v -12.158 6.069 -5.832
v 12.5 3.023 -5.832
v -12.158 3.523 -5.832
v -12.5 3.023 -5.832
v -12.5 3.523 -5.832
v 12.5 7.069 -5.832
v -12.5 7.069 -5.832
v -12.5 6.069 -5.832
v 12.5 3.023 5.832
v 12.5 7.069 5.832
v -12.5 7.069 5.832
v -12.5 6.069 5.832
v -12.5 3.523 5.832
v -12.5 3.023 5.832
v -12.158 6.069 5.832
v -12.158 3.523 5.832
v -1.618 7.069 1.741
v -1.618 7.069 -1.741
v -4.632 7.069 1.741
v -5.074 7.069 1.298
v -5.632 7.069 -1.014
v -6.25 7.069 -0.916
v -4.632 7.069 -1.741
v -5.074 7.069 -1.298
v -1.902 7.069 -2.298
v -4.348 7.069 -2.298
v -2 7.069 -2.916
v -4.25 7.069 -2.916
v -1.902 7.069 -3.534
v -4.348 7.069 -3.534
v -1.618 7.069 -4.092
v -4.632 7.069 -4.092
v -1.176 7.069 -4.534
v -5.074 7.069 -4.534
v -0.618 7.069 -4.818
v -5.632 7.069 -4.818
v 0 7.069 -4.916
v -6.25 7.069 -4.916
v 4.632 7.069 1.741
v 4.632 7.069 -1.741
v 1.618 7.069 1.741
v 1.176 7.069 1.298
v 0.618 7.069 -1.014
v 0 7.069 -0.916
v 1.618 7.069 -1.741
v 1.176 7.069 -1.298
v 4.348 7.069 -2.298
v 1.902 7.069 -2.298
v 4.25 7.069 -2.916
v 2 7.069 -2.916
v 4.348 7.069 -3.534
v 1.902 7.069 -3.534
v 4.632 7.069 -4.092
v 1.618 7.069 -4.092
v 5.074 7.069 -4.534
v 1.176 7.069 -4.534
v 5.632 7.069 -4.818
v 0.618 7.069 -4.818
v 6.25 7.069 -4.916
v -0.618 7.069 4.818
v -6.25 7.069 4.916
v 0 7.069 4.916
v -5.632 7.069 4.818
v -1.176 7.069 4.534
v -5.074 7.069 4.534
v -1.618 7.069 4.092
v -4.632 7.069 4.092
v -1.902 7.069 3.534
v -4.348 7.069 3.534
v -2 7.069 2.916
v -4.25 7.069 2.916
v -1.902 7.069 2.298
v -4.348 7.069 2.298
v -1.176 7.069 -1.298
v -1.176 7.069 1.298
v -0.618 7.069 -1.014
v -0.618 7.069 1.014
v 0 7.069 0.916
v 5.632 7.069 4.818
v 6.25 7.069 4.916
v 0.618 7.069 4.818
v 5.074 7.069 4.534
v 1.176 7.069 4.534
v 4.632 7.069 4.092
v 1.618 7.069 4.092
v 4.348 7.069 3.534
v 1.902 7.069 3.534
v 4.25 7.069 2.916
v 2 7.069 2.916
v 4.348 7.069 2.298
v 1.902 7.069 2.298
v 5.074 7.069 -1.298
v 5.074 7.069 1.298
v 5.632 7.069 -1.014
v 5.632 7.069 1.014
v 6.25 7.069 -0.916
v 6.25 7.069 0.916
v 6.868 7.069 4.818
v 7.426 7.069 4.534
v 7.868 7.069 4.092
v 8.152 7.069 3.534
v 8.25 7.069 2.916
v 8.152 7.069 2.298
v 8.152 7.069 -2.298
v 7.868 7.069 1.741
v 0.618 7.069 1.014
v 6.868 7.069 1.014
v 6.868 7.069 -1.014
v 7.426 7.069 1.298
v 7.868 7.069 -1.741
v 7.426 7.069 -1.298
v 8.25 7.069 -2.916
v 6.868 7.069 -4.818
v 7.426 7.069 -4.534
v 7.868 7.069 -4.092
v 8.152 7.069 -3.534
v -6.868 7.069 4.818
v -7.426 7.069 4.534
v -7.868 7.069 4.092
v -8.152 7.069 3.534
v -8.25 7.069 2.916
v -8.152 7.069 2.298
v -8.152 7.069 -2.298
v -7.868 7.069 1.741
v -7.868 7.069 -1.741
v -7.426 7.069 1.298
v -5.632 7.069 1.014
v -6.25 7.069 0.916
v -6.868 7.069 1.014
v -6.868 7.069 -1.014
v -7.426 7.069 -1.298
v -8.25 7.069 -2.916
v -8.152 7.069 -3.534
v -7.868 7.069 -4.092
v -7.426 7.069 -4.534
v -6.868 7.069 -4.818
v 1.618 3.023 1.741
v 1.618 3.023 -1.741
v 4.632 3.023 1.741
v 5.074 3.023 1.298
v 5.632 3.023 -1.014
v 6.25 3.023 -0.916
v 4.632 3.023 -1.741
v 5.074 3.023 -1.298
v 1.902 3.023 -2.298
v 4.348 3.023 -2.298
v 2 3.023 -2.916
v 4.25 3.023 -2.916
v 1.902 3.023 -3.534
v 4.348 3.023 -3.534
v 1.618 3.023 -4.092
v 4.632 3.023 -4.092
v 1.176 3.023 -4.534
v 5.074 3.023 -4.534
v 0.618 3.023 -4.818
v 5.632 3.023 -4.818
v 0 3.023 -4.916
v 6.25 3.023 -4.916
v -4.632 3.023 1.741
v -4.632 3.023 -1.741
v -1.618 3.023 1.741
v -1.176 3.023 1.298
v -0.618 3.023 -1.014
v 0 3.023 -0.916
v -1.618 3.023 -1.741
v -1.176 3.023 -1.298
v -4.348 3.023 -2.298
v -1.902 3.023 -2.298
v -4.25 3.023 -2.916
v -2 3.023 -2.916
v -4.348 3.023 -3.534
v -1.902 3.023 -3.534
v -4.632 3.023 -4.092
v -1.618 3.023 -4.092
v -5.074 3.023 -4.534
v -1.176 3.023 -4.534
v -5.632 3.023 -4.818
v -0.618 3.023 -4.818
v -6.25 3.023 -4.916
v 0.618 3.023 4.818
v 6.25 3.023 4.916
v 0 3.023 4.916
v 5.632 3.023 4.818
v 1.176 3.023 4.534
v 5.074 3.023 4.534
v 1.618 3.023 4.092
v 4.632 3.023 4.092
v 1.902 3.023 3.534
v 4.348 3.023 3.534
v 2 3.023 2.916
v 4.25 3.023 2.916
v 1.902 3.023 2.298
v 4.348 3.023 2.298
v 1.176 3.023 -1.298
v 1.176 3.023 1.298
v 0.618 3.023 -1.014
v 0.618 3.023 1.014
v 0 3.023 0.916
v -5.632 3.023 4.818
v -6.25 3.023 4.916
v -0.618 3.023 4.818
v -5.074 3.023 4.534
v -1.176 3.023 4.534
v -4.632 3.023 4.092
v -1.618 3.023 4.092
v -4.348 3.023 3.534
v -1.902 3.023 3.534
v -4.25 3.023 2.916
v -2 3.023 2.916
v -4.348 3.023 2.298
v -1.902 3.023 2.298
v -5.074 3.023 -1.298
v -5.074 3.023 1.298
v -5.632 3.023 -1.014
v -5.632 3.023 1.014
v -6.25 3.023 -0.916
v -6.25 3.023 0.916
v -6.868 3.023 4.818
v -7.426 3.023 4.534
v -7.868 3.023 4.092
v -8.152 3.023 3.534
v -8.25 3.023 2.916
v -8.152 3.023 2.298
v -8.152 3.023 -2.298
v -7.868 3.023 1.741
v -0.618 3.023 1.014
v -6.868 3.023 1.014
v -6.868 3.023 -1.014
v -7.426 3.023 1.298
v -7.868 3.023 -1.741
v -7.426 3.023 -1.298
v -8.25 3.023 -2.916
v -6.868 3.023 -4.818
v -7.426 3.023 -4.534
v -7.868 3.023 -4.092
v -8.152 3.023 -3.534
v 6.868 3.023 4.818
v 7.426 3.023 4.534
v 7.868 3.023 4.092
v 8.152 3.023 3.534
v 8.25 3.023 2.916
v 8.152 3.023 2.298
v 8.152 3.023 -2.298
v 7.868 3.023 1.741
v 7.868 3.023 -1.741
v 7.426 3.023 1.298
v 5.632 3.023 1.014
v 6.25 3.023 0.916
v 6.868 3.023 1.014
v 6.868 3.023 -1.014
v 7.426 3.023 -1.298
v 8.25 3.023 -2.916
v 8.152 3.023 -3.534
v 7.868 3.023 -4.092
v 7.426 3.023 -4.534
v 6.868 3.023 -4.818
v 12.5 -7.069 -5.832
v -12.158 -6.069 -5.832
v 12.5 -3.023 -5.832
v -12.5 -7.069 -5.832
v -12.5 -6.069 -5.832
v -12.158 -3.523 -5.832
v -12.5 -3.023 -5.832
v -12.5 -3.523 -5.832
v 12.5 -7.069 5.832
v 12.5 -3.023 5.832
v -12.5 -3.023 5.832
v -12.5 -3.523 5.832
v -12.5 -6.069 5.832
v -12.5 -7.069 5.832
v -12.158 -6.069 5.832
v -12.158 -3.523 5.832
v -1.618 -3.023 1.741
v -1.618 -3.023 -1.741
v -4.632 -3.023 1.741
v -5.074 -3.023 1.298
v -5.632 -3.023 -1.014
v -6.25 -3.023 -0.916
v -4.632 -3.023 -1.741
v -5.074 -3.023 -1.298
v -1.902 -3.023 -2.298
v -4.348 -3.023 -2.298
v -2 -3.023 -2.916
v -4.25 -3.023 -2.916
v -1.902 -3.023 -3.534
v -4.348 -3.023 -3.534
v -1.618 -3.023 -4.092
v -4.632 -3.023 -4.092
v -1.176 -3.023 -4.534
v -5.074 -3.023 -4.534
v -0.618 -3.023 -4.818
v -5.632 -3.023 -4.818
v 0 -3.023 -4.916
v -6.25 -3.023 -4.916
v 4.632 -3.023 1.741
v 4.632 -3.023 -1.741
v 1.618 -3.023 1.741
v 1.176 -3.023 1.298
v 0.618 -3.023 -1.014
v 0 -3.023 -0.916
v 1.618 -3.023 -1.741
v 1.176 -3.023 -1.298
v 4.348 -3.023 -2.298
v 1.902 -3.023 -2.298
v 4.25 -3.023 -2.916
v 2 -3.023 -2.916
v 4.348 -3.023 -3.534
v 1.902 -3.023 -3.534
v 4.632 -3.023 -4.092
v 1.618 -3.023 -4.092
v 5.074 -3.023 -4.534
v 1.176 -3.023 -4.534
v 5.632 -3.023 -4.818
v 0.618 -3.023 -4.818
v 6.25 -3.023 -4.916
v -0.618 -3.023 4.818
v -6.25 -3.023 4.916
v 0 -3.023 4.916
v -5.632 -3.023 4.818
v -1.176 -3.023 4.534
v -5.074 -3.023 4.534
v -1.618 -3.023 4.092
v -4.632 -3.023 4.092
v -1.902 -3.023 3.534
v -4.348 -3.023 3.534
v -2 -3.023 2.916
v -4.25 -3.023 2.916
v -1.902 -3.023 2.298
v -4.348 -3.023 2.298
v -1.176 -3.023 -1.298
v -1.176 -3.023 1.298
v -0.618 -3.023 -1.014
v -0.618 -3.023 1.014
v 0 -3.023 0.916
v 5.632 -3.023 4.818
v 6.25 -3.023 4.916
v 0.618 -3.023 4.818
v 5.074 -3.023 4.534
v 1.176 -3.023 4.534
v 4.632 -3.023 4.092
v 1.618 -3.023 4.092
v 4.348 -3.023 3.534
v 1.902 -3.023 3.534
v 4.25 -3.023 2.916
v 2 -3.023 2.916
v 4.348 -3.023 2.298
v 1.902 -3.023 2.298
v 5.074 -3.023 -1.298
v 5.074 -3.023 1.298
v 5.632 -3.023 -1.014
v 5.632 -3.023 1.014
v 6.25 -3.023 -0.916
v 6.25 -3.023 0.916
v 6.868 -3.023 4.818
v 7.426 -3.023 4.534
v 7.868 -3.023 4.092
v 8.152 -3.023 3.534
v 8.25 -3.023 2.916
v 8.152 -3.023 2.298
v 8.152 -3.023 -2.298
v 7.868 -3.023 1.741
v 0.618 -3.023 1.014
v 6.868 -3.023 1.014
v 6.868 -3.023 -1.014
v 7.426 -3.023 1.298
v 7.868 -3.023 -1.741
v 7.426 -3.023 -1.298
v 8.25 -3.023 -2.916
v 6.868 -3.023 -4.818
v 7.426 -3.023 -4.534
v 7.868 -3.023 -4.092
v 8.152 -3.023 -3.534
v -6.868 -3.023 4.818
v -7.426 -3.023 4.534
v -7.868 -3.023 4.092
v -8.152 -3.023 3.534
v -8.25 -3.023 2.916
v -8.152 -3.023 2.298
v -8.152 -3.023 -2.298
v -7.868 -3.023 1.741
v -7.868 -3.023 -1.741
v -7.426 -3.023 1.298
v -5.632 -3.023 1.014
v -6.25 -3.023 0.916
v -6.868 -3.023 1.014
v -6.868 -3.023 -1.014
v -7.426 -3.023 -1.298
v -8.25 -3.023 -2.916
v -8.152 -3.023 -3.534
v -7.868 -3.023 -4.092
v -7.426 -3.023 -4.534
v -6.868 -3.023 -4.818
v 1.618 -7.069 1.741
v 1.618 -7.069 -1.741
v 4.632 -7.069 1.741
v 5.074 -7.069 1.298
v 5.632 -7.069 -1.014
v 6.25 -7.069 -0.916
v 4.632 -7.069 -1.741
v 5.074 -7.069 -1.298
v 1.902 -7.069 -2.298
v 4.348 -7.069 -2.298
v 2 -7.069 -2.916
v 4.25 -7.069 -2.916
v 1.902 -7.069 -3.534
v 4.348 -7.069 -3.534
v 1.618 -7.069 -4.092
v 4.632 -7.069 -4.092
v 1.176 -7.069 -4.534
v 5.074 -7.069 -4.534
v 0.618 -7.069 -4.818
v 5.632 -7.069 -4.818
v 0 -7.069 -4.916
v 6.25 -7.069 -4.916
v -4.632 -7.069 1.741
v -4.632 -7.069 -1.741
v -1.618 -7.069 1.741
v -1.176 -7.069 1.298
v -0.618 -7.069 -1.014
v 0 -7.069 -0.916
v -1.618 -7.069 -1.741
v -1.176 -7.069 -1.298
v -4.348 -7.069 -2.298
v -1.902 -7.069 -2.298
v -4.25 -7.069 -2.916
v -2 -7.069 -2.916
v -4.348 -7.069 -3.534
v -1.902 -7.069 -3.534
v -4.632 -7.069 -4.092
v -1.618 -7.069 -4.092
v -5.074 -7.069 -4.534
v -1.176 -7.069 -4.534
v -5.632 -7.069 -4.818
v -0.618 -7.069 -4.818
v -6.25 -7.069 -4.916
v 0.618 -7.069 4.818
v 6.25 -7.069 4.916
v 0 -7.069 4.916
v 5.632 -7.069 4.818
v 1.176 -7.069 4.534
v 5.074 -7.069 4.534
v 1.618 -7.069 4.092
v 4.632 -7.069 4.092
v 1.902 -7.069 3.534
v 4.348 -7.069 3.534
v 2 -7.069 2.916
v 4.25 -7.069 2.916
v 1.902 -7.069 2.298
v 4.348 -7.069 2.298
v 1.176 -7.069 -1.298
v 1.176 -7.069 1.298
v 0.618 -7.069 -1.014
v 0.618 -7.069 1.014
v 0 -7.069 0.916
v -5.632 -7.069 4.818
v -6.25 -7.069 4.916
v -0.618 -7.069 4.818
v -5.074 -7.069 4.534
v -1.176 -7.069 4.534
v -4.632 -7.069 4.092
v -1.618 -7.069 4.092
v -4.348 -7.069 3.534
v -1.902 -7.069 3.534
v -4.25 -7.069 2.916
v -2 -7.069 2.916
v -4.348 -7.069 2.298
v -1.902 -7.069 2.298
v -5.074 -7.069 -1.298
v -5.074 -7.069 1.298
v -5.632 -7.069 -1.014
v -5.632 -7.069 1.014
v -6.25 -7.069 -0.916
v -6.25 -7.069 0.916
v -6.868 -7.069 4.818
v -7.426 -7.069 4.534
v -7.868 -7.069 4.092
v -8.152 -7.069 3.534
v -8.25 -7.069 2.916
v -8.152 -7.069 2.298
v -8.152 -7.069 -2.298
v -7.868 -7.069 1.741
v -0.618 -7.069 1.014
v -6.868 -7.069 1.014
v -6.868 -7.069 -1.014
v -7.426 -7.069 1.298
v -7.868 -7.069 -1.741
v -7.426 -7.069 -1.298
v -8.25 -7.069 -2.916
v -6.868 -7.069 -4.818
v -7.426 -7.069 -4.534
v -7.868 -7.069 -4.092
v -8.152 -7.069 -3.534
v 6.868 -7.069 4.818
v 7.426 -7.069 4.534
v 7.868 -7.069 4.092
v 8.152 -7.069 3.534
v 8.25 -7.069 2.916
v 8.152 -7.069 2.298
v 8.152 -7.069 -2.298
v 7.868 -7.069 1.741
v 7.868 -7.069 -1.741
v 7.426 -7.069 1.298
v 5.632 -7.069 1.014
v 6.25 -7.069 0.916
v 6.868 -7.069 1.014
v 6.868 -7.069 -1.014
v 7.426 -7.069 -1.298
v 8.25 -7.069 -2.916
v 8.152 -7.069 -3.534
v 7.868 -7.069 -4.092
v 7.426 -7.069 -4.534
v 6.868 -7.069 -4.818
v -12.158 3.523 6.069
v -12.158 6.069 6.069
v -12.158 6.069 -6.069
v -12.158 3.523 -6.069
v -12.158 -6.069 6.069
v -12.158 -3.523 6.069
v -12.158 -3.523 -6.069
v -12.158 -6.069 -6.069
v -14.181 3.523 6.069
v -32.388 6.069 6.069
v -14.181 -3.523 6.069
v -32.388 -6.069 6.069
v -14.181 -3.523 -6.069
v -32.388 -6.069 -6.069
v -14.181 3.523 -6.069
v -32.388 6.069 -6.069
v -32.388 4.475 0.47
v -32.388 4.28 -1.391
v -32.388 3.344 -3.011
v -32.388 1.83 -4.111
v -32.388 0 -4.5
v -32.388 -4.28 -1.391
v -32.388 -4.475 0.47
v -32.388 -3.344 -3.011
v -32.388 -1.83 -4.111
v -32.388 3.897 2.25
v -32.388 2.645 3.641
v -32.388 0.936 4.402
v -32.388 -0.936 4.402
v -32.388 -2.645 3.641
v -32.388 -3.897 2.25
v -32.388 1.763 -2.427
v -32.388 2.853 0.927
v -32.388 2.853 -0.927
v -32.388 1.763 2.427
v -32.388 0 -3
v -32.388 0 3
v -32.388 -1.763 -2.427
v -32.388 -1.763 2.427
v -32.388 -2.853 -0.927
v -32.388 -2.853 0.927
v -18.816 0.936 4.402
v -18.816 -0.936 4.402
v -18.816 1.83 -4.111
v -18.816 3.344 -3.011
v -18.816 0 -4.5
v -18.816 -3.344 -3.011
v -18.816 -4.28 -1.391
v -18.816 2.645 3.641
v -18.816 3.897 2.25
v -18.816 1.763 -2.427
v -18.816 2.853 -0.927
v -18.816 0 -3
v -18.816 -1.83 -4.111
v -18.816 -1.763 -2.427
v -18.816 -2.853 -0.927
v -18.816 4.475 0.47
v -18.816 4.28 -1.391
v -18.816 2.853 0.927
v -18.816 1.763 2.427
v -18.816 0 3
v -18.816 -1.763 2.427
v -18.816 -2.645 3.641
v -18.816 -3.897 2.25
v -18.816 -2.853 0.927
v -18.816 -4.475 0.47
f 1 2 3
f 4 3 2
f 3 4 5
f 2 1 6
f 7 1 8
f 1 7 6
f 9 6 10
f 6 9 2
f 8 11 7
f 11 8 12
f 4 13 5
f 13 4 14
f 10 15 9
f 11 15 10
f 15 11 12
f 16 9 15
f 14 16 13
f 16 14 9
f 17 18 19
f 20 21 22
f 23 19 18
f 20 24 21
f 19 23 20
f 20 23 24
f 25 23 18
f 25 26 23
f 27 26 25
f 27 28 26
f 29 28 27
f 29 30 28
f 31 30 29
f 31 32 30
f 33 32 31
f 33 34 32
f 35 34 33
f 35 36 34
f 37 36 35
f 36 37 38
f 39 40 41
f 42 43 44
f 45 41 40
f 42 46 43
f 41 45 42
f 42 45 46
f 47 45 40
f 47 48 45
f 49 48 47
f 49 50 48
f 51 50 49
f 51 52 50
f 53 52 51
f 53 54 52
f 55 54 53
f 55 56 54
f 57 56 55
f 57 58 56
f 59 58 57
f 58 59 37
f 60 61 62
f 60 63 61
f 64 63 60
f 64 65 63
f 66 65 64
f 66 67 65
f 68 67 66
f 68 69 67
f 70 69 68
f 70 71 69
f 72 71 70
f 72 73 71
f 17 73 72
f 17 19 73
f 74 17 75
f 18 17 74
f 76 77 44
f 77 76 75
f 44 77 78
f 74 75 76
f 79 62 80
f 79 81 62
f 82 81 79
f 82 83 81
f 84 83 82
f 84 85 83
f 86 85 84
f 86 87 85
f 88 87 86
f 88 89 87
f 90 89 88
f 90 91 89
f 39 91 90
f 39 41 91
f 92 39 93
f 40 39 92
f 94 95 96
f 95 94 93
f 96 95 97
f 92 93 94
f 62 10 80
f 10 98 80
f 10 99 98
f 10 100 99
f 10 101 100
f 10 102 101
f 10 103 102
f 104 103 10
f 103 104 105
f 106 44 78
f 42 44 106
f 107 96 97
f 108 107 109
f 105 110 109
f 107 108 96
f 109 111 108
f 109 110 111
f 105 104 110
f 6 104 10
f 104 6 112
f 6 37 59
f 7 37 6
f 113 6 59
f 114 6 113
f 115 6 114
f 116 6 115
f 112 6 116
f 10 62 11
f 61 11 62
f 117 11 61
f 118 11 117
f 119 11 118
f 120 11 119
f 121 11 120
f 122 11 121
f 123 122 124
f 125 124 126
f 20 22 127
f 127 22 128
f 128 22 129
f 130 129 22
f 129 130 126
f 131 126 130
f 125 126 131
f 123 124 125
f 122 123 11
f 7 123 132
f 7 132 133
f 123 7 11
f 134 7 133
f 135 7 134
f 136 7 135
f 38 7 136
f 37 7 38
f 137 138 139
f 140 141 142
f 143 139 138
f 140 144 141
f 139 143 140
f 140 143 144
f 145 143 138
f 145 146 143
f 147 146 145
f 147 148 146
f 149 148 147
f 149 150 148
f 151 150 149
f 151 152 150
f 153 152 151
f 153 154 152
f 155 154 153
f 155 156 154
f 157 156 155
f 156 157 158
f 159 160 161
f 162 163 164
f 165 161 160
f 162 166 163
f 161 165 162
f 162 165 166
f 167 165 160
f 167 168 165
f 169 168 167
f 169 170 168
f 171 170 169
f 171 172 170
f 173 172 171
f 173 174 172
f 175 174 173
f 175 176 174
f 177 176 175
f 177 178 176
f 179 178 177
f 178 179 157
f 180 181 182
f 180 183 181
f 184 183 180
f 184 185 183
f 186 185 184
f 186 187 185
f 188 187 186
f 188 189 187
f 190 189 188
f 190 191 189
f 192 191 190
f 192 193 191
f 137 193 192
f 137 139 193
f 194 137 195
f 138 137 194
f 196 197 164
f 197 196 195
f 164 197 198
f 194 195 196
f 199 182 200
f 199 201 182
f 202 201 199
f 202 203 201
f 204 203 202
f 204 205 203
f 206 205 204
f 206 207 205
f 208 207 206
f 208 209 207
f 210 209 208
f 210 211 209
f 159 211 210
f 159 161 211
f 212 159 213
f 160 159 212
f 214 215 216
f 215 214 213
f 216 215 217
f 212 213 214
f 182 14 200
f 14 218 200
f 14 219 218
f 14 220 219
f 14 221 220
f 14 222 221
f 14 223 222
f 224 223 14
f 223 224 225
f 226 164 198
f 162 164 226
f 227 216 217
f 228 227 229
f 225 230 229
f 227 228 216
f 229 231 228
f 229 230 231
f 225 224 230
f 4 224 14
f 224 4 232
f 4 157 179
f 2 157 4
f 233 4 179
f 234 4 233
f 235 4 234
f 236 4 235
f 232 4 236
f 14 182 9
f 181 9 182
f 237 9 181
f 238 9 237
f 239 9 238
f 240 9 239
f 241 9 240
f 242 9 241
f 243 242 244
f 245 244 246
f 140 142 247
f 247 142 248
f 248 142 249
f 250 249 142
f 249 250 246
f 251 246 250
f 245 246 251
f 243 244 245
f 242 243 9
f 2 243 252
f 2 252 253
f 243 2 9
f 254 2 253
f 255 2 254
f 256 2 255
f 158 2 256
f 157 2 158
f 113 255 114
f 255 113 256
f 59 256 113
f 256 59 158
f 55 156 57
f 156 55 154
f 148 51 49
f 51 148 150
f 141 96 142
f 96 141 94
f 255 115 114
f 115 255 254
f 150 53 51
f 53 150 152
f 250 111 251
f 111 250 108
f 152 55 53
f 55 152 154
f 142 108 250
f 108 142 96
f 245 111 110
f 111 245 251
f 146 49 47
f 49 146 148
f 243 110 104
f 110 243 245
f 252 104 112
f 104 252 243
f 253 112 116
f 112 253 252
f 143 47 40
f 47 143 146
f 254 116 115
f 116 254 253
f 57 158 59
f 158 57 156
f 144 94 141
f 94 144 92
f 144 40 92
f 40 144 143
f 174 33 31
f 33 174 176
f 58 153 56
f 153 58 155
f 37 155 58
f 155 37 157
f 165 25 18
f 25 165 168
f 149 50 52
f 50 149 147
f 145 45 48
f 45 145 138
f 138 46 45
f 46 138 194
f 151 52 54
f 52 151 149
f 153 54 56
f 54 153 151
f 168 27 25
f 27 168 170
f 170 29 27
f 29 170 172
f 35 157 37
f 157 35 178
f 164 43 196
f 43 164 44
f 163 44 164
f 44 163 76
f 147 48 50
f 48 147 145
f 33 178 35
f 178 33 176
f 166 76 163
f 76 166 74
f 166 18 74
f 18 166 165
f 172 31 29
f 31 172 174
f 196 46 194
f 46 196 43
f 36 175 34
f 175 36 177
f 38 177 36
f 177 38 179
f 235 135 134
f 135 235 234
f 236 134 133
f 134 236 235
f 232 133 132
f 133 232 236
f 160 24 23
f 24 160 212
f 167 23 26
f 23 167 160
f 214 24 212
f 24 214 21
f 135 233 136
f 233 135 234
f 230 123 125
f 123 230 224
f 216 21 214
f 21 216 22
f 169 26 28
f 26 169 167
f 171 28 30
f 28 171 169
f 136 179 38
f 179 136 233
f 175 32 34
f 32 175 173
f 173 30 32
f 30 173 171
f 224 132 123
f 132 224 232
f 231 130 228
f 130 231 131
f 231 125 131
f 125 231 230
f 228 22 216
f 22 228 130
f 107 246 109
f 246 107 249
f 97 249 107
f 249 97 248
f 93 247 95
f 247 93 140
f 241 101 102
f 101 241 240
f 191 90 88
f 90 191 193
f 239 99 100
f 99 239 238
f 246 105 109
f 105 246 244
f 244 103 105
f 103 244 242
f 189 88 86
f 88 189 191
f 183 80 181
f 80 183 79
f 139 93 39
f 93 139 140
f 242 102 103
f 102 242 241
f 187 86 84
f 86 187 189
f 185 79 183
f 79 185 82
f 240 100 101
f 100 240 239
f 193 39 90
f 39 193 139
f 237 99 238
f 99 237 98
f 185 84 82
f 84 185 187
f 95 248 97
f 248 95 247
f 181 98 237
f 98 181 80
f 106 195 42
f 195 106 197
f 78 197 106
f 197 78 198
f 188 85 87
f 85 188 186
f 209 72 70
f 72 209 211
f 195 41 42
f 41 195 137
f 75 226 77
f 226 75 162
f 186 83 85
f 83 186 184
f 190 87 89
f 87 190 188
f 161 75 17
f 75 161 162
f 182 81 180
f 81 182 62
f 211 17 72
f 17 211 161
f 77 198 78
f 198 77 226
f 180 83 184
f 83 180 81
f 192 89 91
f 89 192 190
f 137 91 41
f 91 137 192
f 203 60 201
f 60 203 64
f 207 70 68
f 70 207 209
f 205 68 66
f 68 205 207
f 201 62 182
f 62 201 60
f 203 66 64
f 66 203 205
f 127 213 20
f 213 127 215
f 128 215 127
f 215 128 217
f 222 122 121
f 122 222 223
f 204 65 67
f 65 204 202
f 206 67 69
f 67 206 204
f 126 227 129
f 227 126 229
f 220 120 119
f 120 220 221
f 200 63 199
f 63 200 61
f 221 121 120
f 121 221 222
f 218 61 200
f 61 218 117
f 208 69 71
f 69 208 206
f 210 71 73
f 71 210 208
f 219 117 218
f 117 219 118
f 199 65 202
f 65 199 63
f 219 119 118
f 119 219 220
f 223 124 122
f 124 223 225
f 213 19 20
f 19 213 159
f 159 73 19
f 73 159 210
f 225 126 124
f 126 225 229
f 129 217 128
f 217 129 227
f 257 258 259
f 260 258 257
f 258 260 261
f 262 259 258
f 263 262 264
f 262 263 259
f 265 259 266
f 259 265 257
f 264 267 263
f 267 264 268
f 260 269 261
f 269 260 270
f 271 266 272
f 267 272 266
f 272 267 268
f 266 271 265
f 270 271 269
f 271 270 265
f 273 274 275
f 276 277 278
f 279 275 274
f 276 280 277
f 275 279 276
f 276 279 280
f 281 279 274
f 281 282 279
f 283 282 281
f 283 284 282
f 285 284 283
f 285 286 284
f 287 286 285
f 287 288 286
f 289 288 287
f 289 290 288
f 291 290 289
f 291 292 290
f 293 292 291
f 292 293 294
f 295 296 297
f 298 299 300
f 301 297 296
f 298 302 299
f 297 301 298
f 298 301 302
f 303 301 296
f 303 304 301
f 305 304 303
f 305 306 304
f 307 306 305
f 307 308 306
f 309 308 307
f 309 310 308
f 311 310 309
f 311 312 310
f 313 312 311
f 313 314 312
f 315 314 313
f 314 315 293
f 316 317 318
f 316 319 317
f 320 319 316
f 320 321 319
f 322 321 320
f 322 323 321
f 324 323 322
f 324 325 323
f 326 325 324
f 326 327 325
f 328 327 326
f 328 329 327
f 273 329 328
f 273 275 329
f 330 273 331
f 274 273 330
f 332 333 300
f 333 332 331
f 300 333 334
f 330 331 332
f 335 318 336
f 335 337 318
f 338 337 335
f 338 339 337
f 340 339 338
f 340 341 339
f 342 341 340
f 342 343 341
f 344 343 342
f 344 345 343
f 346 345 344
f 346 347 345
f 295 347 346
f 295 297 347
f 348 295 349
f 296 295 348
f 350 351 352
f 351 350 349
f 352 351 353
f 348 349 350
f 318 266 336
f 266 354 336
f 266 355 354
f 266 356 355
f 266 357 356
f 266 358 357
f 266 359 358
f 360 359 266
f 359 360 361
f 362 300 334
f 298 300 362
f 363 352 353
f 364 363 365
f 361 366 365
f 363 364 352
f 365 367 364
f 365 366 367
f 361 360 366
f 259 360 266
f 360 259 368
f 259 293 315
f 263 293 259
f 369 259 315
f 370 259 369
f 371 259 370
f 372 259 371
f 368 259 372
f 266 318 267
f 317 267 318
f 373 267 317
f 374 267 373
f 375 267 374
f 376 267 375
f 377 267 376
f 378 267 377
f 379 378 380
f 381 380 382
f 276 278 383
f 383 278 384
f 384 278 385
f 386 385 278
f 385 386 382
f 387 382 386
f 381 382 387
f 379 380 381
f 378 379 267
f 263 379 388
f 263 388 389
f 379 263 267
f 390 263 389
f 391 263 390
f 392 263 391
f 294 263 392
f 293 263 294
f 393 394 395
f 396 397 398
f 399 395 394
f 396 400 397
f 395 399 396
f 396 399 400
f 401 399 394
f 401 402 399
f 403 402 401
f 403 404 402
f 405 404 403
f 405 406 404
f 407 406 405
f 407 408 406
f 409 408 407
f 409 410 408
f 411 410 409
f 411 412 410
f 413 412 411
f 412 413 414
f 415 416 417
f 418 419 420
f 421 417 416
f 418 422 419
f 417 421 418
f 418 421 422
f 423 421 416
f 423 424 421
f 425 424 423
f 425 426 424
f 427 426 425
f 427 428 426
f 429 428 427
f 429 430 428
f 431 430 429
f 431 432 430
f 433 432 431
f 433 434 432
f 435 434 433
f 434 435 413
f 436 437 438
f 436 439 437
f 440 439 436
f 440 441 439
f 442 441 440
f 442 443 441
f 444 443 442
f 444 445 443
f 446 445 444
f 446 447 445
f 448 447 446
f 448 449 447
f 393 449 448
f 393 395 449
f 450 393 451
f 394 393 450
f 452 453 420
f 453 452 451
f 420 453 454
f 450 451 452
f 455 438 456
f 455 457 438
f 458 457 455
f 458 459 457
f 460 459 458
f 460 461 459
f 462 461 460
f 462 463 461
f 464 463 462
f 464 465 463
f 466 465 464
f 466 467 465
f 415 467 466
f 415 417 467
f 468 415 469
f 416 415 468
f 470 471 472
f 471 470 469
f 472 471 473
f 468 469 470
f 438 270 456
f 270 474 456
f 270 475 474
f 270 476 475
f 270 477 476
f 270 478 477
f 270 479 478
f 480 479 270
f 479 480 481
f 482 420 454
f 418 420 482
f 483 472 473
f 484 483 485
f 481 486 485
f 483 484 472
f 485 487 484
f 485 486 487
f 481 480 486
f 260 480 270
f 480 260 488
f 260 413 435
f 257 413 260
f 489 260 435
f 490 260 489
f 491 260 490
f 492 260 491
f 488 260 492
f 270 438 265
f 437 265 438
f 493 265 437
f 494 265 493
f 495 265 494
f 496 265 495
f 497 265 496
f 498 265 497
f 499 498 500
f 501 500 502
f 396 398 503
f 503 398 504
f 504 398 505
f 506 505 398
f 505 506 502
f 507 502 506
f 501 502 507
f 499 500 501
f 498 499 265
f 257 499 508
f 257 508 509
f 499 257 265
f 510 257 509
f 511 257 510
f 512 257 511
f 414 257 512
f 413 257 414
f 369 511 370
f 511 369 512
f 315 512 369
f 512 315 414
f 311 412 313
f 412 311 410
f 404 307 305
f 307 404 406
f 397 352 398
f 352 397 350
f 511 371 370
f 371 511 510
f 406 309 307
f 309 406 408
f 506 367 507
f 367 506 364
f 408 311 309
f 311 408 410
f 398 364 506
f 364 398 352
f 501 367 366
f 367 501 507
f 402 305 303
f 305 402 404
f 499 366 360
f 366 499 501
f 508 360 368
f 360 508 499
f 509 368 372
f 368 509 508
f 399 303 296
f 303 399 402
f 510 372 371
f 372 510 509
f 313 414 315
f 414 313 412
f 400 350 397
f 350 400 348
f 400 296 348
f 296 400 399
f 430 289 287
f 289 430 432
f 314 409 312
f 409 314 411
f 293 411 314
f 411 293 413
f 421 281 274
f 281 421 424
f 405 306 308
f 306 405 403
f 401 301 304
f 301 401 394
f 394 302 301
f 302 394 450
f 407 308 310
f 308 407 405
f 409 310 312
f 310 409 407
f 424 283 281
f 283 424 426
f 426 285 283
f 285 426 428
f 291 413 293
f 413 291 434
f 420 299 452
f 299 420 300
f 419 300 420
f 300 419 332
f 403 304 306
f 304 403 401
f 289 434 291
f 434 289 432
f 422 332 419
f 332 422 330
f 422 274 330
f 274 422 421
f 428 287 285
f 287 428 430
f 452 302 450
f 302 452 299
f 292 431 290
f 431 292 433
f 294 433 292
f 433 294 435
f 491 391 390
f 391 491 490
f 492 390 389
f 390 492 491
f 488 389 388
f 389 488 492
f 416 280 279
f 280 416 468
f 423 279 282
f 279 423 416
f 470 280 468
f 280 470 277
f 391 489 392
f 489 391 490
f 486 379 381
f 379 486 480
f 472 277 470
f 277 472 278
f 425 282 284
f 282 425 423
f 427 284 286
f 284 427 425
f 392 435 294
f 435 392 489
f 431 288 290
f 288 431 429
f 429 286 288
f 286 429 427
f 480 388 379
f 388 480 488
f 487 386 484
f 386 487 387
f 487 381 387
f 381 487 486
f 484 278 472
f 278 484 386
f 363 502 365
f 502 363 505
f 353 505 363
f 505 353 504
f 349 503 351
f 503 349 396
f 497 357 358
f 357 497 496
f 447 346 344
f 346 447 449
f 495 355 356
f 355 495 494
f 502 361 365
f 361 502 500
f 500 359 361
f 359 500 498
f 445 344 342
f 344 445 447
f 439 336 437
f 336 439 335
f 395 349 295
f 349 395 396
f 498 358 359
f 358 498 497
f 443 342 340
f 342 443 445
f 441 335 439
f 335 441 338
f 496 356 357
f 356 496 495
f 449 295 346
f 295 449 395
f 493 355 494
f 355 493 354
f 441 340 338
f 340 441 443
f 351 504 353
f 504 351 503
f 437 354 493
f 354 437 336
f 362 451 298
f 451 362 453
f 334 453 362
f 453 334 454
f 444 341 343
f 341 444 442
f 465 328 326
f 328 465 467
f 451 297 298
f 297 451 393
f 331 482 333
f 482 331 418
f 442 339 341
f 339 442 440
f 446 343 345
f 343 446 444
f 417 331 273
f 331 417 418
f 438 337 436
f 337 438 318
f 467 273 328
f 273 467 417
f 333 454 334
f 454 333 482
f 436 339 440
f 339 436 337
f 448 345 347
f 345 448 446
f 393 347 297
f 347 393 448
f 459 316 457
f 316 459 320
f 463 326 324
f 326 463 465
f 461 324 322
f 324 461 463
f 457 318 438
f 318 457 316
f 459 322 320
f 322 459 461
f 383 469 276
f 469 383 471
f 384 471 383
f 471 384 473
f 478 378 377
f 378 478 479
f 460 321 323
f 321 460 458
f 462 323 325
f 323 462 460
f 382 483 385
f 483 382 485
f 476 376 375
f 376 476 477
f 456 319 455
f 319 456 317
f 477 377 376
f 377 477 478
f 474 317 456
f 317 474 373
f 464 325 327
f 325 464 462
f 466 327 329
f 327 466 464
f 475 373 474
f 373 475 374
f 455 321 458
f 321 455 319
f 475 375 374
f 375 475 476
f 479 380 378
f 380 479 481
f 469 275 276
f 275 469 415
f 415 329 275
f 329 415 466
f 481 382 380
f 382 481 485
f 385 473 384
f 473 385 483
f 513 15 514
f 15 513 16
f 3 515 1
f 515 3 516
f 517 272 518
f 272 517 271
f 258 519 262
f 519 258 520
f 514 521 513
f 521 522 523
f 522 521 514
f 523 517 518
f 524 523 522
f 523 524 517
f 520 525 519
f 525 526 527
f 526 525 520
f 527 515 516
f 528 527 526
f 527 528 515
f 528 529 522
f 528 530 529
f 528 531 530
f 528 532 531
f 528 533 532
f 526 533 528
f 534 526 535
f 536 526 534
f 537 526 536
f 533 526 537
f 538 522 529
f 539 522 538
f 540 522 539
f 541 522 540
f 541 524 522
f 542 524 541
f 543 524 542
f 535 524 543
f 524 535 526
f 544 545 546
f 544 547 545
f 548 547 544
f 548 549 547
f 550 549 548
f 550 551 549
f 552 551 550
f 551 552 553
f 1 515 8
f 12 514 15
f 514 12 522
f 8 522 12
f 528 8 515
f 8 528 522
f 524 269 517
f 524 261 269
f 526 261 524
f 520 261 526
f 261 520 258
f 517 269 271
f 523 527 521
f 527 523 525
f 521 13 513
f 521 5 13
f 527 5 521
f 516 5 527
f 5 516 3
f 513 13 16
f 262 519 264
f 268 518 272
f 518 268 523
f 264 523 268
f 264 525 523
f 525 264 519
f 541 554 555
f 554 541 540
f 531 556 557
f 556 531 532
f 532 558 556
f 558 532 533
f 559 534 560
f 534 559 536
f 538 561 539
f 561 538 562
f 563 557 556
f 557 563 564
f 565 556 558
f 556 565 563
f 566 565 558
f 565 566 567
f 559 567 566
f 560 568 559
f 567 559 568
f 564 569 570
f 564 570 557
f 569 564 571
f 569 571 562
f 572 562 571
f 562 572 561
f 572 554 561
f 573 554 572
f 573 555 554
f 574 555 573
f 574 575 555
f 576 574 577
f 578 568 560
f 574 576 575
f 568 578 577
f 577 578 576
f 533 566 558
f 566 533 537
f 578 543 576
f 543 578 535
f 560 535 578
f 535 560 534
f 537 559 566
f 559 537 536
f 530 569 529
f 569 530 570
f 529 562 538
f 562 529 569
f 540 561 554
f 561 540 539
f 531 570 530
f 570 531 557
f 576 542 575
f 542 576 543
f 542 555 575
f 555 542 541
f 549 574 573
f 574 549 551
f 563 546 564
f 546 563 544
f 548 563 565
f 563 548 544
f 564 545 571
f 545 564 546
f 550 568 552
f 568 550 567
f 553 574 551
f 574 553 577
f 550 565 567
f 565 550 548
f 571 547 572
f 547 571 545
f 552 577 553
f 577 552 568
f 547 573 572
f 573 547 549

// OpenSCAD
//    TurretJoin.scad
//    Copyright 2015, Robert L. Read

//    This program is free software: you can redistribute it and/or modify
//    it under the terms of the GNU General Public License as published by
//    the Free Software Foundation, either version 3 of the License, or
//    (at your option) any later version.
//
//    This program is distributed in the hope that it will be useful,
//    but WITHOUT ANY WARRANTY; without even the implied warranty of
//    MERCHANTABILITY or FITNESS FOR A PARTICULAR PURPOSE.  See the
//    GNU General Public License for more details.
//
//    You should have received a copy of the GNU General Public License
//    along with this program.  If not, see <http://www.gnu.org/licenses/>.
    
    

// Some parameters for the Beholder Joint
// These units are in mm (I generall print all of this at 1/4th size!)
ball_radius = 100/4; // Ths inner ball of the Beholder
rotor_thickness = 10/4; // The thickness of the moving "rotors"
lock_thickness = 10/4; // The thickness of the locking shell
rotor_gap = 3/4; // a tolerance space to allow motion

mounting_clevis_height = 100/4;

// These units are in degrees
// some of these are explicitly created from my Gluss Pusher model
// 
least_spread_angle = 19.47;
most_spread_angle = 48.59;

screw_hole_radius_mm = 8/4; // This is a guess (this is guess for #4 machines screws when reduced by a factor of 4)
locking_peg_percent_tolerance = 5;


// the edge difference of the rotor to make sure it doesn't fall out
safety_lip_angle = 4;

// the angle of the post (at the surface of the rotor!)
post_half_angle = 2;

ball_locking_peg_width_factor = 10;
ball_locking_peg_height_factor = 4;
ball_locking__peg_tolerance_factor = 1.0;

three_hole_cap_seam_height_mm = 10/4;

module fake_module_so_customizer_does_not_show_computed_values() {
}

// Let's go for some high-res spheres (I don't fully understand this variable!)
$fa = 6;


// Computed parameters...
// Note that I implicitly assuming this hole is centered on the 
// tetrahedronal geomety---that is neither necessary nor obviously
// correct in the case of Gluss Triangle.  I will have to 
// generate the holes by a more general mechanism later.
hole_angle = most_spread_angle - least_spread_angle;
radius_at_rotor_edge = ball_radius+rotor_thickness+2*rotor_gap;
outermost_radius = radius_at_rotor_edge + lock_thickness;

hole_size_mm = radius_at_rotor_edge*2.0*sin(hole_angle/2);

rotor_size_mm = (ball_radius+rotor_thickness+2*rotor_gap)*2.0*sin((hole_angle+2*post_half_angle)/2.0);

post_radius_mm = radius_at_rotor_edge*sin(2*post_half_angle);

rotor_hole_angle = (most_spread_angle + least_spread_angle) / 2;


echo("Rotor Hole Angle");
echo(rotor_hole_angle);

//insert

// This code came from "Andrei" http://forum.openscad.org/Cylinders-td2443.html

module cylinder_ep(p1, p2, r1, r2) {
translate(p1)sphere(r=r1,center=true);
translate(p2)sphere(r=r2,center=true);
assign(vector = [p2[0] - p1[0],p2[1] - p1[1],p2[2] - p1[2]])
assign(distance = sqrt(pow(vector[0], 2) +
pow(vector[1], 2) +
pow(vector[2], 2)))
translate(vector/2 + p1)
//rotation of XoY plane by the Z axis with the angle of the [p1 p2] line projection with the X axis on the XoY plane
rotate([0, 0, atan2(vector[1], vector[0])]) //rotation
//rotation of ZoX plane by the y axis with the angle given by the z coordinate and the sqrt(x^2 + y^2)) point in the XoY plane
rotate([0, atan2(sqrt(pow(vector[0], 2)+pow(vector[1], 2)),vector[2]), 0])
cylinder(h = distance, r1 = r1, r2 = r2,center=true);
}

// lintrans is the linear translation along the p0 and p1 points to put the box.
module six_hole_box_ep(p1, p2, lintrans, w, d,h) {
assign(vector = [p2[0] - p1[0],p2[1] - p1[1],p2[2] - p1[2]])
assign(distance = sqrt(pow(vector[0], 2) +
pow(vector[1], 2) +
pow(vector[2], 2)))
translate(vector*lintrans + p1)
//rotation of XoY plane by the Z axis with the angle of the [p1 p2] line projection with the X axis on the XoY plane
rotate([0, 0, atan2(vector[1], vector[0])]) //rotation
//rotation of ZoX plane by the y axis with the angle given by the z coordinate and the sqrt(x^2 + y^2)) point in the XoY plane
rotate([0, atan2(sqrt(pow(vector[0], 2)+pow(vector[1], 2)),vector[2]), 0])
 difference() { // Cut six holes out!
cube([w,d,h],center=true);
translate([w/4,0,h/4]) rotate([90,0,0]) cylinder(h=(w+h+d),r=screw_hole_radius_mm,center=true);
translate([w/4,0,0]) rotate([90,0,0]) cylinder(h=(w+h+d),r=screw_hole_radius_mm,center=true);
translate([w/4,0,-h/4]) rotate([90,0,0]) cylinder(h=(w+h+d),r=screw_hole_radius_mm,center=true);
translate([-w/4,0,h/4]) rotate([90,0,0]) cylinder(h=(w+h+d),r=screw_hole_radius_mm,center=true);
translate([-w/4,0,0]) rotate([90,0,0]) cylinder(h=(w+h+d),r=screw_hole_radius_mm,center=true);
translate([-w/4,0,-h/4]) rotate([90,0,0]) cylinder(h=(w+h+d),r=screw_hole_radius_mm,center=true);

 }
}
 

module cylindricalize_edges(edges,points,rad) {
    for(e = edges) {
        p0 = points[e[0]];
        p1 = points[e[1]];
        color("red") cylinder_ep(p0, p1, rad, rad, $fn=20);
    }
}

// The purpose here is to produce a matching part that mates to 
// our rotor pegs for mounting a rod (like a carbon-fiber rod with a 
// 1/4" interior diameter, for example).
// This is a sloppy, ugly function --- I did this very hastily.
module six_hole_clevis() {
    p0 = [0,0,0];
    p1 = [100,0,0];
    width = hole_size_mm*0.8;
    depth = post_radius_mm*2;
    height = mounting_clevis_height;
    tolerance = 1;
    // This is for my particular carbon fiber connector rod, this really needs to be parametrized.
    difference() {
        union () {
             translate([0,depth+tolerance,0])
            color("gray") six_hole_box_ep(p0, p1, 0.0, width, depth, height, $fn=20);  
             translate([0,-depth+-tolerance,0])
           color("gray") six_hole_box_ep(p0, p1, 0.0, width, depth, height, $fn=20);  
                translate([-height*.81 + - depth/2,0,0])
            difference() {
            cube([depth*5,depth*3,depth*3],center=true);
                translate([depth*4.5,0,0])
                cube([depth*5,depth+tolerance*3,depth*4],center=true);
            }
        }
   
        translate([-height*1.4,0,0])
        rotate([0,90,0])
        difference() {
            // These are measured numbers in mm, but my STL is 4 times too big! Need to 
            // clean this up.
        color("blue") cylinder(h = depth*4,r = 4.5);
        color("red") cylinder(h = depth*4,r = 3);
        }

    }
}

module beamify_edges(edges,points,width,depth,height) {
    for(e = edges) {
        p0 = points[e[0]];
        p1 = points[e[1]];
        color("green") six_hole_box_ep(p0, p1, 0.37, width, depth, height, $fn=20);      
    }
}



// Create a tetrahedron-like strucutre with one point
// centered on the origin, symmetric about z axis,
// with an equilateral triangle as a base
// height - height of the pyrmid
// base - length of one side of the pyramid base
// r - raadius
module create_symmetric_3_member_polygon(height,base,r) {
    h = base*sqrt(3.0)/2.0;
    basehalf = base / 2.0;
    ZH = height;
points = [
    // first point is the origin
[ 0, 0, 0],
[ h*2/3,  0, -ZH],
[-h/3, -basehalf , -ZH],
[-h/3, basehalf, -ZH]];
edges = [
[0,1],
[0,2],
[0,3]
    ];
   cylindricalize_edges(edges,points,r); 
}

// Create a tetrahedron-like strucutre with one point
// centered on the origin, symmetric about z axis,
// with an equilateral triangle as a base
// height - height of the pyrmid
// base - length of one side of the pyramid base
// r - raadius
module create_symmetric_3_member_polygon_cube(height,base,r) {
    h = base*sqrt(3.0)/2.0;
    basehalf = base / 2.0;
    ZH = height;
points = [
    // first point is the origin
[ 0, 0, 0],
[ h*2/3,  0, -ZH],
[-h/3, -basehalf , -ZH],
[-h/3, basehalf, -ZH]];
edges = [
[0,1],
[0,2],
[0,3]
    ];
   beamify_edges(edges,points,hole_size_mm*0.8,post_radius_mm*2,mounting_clevis_height); 
}


module create_symmetric_3_member_polygon_polar(height,angle,r) {
    triangle_height = height*tan(angle)*3/2;
    base = triangle_height* 2 / sqrt(3.0);
    create_symmetric_3_member_polygon(height,base,r);
}

module create_symmetric_3_member_polygon_polar_cube(height,angle,r) {
    triangle_height = height*tan(angle)*3/2;
    base = triangle_height* 2 / sqrt(3.0);
    create_symmetric_3_member_polygon_cube(height,base,r);
}

module ball_locking_peg(width_factor = 10,height_factor = 4, tolerance_factor = 1.0) {
  translate([ball_radius/2,0,0]) cylinder(r = tolerance_factor * ball_radius/width_factor, h = tolerance_factor *ball_radius/height_factor,center = true);
}
module three_locking_pegs(tf) {  
 union() {
    rotate([0,0,0]) ball_locking_peg(tolerance_factor = tf);
    rotate([0,0,120]) ball_locking_peg(tolerance_factor = tf);
    rotate([0,0,240]) ball_locking_peg(tolerance_factor = tf);
 }
}

// I am really making this a hemisphere now
// so that we can see into it.  That of course 
// can be changed later.
module beholderBall(d) {
    difference() {
    union() {
        difference() {
            sphere(d);
            translate([-d,-d,0]) cube(2*d);
        }
        three_locking_pegs(1.0 - locking_peg_percent_tolerance/100.0);
    }
    rotate([0,0,60]) three_locking_pegs(1.0 + locking_peg_percent_tolerance/100.0);
}
}

module beholderLock(d) {
    inner = d + rotor_thickness + rotor_gap*2;
    outer = inner + lock_thickness;
    difference() {
        beholderBall(outer);
        sphere(inner);
    }
    
}

module beholderRotorsShell(d,buffer) {
    inner = d + rotor_gap;
    outer = inner + rotor_thickness;
    difference() {
        beholderBall(outer+buffer);
        sphere(inner-buffer);
    }
}

module equilateral_cut_tool_for_shell(rf) {
    difference() {
       create_symmetric_3_member_polygon_polar(ball_radius*4,rotor_hole_angle,rf);
       beholderBall(ball_radius);
    }
}

module planar_circle_cut_tool() {
              // rotate 30 degrees
            rotate([0,0,30])
            // Lay it onto x axix...
            rotate([0,90,0]) 
            cylinder(ball_radius*4,r=hole_size_mm/2);
}

module bolting_flange() { 
    translate([radius_at_rotor_edge+lock_thickness,0,-post_radius_mm])
    difference() {
    cylinder(r = hole_size_mm*0.4,h = post_radius_mm,$fn=20);
        translate([lock_thickness,0,-post_radius_mm])
         cylinder(r = screw_hole_radius_mm,h = post_radius_mm*4,$fn=20);
        translate([-ball_radius+-lock_thickness/2,-ball_radius/2,-ball_radius/2])
        cube(ball_radius);
    }
}

module bolting_flanges() {
    bolting_flange();
    rotate([0,0,120])
    bolting_flange();
    rotate([0,0,240])
    bolting_flange();
}

module snowflake_planar_cut_tool() {
    rotate([0,0,0]) planar_circle_cut_tool();
    rotate([0,0,60]) planar_circle_cut_tool();
    rotate([0,0,120]) planar_circle_cut_tool();
    rotate([0,0,180]) planar_circle_cut_tool();
    rotate([0,0,240]) planar_circle_cut_tool();
    rotate([0,0,300]) planar_circle_cut_tool();
}

module tetrahedronal_lock() {
    union() {
    difference() {
        beholderLock(ball_radius);
        equilateral_cut_tool_for_shell(hole_size_mm/2);
        // Now we will attempt to make the other cut outs...
        // These should split the angles of the tetrahedron...
        // So they should be rotate 30 degrees from the x-axis
       snowflake_planar_cut_tool();
    }
    color("green") bolting_flanges();
    }
}

// This is for a lock that works with a hemisphere
// and provides room for the snowflake cuts but does not use 
// a full ball.


module nine_hole_cap_lock() {
    seam_height = (hole_size_mm/2)*1.2;
    // Pythagorean theorem
    cap_radius = sqrt(outermost_radius* outermost_radius - seam_height*seam_height);
    union() {
        difference() {
            union() {  
                rotate([0,0,30]) rotate([180,0,0]) beholderBall(ball_radius);
                rotate([180,0,0]) tetrahedronal_lock();
            }
            translate([0,0,ball_radius/2+seam_height])
                cylinder(r = ball_radius * 2, h = ball_radius,center = true);
        }
        translate([0,0,seam_height])
        cylinder(r = cap_radius, h = lock_thickness,center = true);
    }
}

module three_hole_cap_lock() {

    seam_height = three_hole_cap_seam_height_mm;
    // Pythagorean theorem
    cap_radius = sqrt(outermost_radius* outermost_radius - seam_height*seam_height);
    union() {
        difference() {
            union() {  
                rotate([0,0,30]) rotate([180,0,0]) beholderBall(ball_radius);
                rotate([180,0,0]) tetrahedronal_lock();
            }
            translate([0,0,ball_radius+seam_height])
                cylinder(r = ball_radius * 2, h = ball_radius*2,center = true);
        }
        translate([0,0,seam_height])
        cylinder(r = cap_radius, h = lock_thickness,center = true);
    }
}

module shell(id,od) {
    difference() {
        sphere(od);
        sphere(id);
    }
}

module tetrahedronal_pegs() {
    union() {
      difference() {
            difference() {
                create_symmetric_3_member_polygon_polar(ball_radius*4,rotor_hole_angle,post_radius_mm);
                sphere(ball_radius + rotor_gap + (rotor_thickness / 2.0));
            }
            shell(ball_radius*1.5,ball_radius*20);
    }
    color("green") create_symmetric_3_member_polygon_polar_cube(ball_radius*4,rotor_hole_angle,post_radius_mm);
   }
}

module tetrahedronal_rotors() {
// Now try to attach "pegs" to the rotor discs....
    union() {
       tetrahedronal_pegs();
    difference() { // clean up
        difference() {
            color("green") beholderRotorsShell(ball_radius,0);
            difference () {
                color("gray") beholderRotorsShell(ball_radius,0.5);
               equilateral_cut_tool_for_shell(rotor_size_mm/2.0);
            } 
        }
    // Needed to clean up artifacts...
        d = ball_radius;
       translate([-d*1.2,-d*1.2,-1]) cube(2.5*d);
    }
    }
}

module one_tetrahedronal_rotor() {
    difference() {
        tetrahedronal_rotors();
        translate([-ball_radius*1.8,0,-ball_radius*2]) cube(ball_radius*4,center = true);
    }
}

module beholder_joint() {
    color( "Purple") beholderBall(ball_radius);
    tetrahedronal_rotors();
    tetrahedronal_lock();
 //   translate([0,0,100])
 //   nine_hole_cap_lock();

translate([0,0,25])
 three_hole_cap_lock();
}



 // beholder_joint();

// translate([-40,0,0])
six_hole_clevis();
